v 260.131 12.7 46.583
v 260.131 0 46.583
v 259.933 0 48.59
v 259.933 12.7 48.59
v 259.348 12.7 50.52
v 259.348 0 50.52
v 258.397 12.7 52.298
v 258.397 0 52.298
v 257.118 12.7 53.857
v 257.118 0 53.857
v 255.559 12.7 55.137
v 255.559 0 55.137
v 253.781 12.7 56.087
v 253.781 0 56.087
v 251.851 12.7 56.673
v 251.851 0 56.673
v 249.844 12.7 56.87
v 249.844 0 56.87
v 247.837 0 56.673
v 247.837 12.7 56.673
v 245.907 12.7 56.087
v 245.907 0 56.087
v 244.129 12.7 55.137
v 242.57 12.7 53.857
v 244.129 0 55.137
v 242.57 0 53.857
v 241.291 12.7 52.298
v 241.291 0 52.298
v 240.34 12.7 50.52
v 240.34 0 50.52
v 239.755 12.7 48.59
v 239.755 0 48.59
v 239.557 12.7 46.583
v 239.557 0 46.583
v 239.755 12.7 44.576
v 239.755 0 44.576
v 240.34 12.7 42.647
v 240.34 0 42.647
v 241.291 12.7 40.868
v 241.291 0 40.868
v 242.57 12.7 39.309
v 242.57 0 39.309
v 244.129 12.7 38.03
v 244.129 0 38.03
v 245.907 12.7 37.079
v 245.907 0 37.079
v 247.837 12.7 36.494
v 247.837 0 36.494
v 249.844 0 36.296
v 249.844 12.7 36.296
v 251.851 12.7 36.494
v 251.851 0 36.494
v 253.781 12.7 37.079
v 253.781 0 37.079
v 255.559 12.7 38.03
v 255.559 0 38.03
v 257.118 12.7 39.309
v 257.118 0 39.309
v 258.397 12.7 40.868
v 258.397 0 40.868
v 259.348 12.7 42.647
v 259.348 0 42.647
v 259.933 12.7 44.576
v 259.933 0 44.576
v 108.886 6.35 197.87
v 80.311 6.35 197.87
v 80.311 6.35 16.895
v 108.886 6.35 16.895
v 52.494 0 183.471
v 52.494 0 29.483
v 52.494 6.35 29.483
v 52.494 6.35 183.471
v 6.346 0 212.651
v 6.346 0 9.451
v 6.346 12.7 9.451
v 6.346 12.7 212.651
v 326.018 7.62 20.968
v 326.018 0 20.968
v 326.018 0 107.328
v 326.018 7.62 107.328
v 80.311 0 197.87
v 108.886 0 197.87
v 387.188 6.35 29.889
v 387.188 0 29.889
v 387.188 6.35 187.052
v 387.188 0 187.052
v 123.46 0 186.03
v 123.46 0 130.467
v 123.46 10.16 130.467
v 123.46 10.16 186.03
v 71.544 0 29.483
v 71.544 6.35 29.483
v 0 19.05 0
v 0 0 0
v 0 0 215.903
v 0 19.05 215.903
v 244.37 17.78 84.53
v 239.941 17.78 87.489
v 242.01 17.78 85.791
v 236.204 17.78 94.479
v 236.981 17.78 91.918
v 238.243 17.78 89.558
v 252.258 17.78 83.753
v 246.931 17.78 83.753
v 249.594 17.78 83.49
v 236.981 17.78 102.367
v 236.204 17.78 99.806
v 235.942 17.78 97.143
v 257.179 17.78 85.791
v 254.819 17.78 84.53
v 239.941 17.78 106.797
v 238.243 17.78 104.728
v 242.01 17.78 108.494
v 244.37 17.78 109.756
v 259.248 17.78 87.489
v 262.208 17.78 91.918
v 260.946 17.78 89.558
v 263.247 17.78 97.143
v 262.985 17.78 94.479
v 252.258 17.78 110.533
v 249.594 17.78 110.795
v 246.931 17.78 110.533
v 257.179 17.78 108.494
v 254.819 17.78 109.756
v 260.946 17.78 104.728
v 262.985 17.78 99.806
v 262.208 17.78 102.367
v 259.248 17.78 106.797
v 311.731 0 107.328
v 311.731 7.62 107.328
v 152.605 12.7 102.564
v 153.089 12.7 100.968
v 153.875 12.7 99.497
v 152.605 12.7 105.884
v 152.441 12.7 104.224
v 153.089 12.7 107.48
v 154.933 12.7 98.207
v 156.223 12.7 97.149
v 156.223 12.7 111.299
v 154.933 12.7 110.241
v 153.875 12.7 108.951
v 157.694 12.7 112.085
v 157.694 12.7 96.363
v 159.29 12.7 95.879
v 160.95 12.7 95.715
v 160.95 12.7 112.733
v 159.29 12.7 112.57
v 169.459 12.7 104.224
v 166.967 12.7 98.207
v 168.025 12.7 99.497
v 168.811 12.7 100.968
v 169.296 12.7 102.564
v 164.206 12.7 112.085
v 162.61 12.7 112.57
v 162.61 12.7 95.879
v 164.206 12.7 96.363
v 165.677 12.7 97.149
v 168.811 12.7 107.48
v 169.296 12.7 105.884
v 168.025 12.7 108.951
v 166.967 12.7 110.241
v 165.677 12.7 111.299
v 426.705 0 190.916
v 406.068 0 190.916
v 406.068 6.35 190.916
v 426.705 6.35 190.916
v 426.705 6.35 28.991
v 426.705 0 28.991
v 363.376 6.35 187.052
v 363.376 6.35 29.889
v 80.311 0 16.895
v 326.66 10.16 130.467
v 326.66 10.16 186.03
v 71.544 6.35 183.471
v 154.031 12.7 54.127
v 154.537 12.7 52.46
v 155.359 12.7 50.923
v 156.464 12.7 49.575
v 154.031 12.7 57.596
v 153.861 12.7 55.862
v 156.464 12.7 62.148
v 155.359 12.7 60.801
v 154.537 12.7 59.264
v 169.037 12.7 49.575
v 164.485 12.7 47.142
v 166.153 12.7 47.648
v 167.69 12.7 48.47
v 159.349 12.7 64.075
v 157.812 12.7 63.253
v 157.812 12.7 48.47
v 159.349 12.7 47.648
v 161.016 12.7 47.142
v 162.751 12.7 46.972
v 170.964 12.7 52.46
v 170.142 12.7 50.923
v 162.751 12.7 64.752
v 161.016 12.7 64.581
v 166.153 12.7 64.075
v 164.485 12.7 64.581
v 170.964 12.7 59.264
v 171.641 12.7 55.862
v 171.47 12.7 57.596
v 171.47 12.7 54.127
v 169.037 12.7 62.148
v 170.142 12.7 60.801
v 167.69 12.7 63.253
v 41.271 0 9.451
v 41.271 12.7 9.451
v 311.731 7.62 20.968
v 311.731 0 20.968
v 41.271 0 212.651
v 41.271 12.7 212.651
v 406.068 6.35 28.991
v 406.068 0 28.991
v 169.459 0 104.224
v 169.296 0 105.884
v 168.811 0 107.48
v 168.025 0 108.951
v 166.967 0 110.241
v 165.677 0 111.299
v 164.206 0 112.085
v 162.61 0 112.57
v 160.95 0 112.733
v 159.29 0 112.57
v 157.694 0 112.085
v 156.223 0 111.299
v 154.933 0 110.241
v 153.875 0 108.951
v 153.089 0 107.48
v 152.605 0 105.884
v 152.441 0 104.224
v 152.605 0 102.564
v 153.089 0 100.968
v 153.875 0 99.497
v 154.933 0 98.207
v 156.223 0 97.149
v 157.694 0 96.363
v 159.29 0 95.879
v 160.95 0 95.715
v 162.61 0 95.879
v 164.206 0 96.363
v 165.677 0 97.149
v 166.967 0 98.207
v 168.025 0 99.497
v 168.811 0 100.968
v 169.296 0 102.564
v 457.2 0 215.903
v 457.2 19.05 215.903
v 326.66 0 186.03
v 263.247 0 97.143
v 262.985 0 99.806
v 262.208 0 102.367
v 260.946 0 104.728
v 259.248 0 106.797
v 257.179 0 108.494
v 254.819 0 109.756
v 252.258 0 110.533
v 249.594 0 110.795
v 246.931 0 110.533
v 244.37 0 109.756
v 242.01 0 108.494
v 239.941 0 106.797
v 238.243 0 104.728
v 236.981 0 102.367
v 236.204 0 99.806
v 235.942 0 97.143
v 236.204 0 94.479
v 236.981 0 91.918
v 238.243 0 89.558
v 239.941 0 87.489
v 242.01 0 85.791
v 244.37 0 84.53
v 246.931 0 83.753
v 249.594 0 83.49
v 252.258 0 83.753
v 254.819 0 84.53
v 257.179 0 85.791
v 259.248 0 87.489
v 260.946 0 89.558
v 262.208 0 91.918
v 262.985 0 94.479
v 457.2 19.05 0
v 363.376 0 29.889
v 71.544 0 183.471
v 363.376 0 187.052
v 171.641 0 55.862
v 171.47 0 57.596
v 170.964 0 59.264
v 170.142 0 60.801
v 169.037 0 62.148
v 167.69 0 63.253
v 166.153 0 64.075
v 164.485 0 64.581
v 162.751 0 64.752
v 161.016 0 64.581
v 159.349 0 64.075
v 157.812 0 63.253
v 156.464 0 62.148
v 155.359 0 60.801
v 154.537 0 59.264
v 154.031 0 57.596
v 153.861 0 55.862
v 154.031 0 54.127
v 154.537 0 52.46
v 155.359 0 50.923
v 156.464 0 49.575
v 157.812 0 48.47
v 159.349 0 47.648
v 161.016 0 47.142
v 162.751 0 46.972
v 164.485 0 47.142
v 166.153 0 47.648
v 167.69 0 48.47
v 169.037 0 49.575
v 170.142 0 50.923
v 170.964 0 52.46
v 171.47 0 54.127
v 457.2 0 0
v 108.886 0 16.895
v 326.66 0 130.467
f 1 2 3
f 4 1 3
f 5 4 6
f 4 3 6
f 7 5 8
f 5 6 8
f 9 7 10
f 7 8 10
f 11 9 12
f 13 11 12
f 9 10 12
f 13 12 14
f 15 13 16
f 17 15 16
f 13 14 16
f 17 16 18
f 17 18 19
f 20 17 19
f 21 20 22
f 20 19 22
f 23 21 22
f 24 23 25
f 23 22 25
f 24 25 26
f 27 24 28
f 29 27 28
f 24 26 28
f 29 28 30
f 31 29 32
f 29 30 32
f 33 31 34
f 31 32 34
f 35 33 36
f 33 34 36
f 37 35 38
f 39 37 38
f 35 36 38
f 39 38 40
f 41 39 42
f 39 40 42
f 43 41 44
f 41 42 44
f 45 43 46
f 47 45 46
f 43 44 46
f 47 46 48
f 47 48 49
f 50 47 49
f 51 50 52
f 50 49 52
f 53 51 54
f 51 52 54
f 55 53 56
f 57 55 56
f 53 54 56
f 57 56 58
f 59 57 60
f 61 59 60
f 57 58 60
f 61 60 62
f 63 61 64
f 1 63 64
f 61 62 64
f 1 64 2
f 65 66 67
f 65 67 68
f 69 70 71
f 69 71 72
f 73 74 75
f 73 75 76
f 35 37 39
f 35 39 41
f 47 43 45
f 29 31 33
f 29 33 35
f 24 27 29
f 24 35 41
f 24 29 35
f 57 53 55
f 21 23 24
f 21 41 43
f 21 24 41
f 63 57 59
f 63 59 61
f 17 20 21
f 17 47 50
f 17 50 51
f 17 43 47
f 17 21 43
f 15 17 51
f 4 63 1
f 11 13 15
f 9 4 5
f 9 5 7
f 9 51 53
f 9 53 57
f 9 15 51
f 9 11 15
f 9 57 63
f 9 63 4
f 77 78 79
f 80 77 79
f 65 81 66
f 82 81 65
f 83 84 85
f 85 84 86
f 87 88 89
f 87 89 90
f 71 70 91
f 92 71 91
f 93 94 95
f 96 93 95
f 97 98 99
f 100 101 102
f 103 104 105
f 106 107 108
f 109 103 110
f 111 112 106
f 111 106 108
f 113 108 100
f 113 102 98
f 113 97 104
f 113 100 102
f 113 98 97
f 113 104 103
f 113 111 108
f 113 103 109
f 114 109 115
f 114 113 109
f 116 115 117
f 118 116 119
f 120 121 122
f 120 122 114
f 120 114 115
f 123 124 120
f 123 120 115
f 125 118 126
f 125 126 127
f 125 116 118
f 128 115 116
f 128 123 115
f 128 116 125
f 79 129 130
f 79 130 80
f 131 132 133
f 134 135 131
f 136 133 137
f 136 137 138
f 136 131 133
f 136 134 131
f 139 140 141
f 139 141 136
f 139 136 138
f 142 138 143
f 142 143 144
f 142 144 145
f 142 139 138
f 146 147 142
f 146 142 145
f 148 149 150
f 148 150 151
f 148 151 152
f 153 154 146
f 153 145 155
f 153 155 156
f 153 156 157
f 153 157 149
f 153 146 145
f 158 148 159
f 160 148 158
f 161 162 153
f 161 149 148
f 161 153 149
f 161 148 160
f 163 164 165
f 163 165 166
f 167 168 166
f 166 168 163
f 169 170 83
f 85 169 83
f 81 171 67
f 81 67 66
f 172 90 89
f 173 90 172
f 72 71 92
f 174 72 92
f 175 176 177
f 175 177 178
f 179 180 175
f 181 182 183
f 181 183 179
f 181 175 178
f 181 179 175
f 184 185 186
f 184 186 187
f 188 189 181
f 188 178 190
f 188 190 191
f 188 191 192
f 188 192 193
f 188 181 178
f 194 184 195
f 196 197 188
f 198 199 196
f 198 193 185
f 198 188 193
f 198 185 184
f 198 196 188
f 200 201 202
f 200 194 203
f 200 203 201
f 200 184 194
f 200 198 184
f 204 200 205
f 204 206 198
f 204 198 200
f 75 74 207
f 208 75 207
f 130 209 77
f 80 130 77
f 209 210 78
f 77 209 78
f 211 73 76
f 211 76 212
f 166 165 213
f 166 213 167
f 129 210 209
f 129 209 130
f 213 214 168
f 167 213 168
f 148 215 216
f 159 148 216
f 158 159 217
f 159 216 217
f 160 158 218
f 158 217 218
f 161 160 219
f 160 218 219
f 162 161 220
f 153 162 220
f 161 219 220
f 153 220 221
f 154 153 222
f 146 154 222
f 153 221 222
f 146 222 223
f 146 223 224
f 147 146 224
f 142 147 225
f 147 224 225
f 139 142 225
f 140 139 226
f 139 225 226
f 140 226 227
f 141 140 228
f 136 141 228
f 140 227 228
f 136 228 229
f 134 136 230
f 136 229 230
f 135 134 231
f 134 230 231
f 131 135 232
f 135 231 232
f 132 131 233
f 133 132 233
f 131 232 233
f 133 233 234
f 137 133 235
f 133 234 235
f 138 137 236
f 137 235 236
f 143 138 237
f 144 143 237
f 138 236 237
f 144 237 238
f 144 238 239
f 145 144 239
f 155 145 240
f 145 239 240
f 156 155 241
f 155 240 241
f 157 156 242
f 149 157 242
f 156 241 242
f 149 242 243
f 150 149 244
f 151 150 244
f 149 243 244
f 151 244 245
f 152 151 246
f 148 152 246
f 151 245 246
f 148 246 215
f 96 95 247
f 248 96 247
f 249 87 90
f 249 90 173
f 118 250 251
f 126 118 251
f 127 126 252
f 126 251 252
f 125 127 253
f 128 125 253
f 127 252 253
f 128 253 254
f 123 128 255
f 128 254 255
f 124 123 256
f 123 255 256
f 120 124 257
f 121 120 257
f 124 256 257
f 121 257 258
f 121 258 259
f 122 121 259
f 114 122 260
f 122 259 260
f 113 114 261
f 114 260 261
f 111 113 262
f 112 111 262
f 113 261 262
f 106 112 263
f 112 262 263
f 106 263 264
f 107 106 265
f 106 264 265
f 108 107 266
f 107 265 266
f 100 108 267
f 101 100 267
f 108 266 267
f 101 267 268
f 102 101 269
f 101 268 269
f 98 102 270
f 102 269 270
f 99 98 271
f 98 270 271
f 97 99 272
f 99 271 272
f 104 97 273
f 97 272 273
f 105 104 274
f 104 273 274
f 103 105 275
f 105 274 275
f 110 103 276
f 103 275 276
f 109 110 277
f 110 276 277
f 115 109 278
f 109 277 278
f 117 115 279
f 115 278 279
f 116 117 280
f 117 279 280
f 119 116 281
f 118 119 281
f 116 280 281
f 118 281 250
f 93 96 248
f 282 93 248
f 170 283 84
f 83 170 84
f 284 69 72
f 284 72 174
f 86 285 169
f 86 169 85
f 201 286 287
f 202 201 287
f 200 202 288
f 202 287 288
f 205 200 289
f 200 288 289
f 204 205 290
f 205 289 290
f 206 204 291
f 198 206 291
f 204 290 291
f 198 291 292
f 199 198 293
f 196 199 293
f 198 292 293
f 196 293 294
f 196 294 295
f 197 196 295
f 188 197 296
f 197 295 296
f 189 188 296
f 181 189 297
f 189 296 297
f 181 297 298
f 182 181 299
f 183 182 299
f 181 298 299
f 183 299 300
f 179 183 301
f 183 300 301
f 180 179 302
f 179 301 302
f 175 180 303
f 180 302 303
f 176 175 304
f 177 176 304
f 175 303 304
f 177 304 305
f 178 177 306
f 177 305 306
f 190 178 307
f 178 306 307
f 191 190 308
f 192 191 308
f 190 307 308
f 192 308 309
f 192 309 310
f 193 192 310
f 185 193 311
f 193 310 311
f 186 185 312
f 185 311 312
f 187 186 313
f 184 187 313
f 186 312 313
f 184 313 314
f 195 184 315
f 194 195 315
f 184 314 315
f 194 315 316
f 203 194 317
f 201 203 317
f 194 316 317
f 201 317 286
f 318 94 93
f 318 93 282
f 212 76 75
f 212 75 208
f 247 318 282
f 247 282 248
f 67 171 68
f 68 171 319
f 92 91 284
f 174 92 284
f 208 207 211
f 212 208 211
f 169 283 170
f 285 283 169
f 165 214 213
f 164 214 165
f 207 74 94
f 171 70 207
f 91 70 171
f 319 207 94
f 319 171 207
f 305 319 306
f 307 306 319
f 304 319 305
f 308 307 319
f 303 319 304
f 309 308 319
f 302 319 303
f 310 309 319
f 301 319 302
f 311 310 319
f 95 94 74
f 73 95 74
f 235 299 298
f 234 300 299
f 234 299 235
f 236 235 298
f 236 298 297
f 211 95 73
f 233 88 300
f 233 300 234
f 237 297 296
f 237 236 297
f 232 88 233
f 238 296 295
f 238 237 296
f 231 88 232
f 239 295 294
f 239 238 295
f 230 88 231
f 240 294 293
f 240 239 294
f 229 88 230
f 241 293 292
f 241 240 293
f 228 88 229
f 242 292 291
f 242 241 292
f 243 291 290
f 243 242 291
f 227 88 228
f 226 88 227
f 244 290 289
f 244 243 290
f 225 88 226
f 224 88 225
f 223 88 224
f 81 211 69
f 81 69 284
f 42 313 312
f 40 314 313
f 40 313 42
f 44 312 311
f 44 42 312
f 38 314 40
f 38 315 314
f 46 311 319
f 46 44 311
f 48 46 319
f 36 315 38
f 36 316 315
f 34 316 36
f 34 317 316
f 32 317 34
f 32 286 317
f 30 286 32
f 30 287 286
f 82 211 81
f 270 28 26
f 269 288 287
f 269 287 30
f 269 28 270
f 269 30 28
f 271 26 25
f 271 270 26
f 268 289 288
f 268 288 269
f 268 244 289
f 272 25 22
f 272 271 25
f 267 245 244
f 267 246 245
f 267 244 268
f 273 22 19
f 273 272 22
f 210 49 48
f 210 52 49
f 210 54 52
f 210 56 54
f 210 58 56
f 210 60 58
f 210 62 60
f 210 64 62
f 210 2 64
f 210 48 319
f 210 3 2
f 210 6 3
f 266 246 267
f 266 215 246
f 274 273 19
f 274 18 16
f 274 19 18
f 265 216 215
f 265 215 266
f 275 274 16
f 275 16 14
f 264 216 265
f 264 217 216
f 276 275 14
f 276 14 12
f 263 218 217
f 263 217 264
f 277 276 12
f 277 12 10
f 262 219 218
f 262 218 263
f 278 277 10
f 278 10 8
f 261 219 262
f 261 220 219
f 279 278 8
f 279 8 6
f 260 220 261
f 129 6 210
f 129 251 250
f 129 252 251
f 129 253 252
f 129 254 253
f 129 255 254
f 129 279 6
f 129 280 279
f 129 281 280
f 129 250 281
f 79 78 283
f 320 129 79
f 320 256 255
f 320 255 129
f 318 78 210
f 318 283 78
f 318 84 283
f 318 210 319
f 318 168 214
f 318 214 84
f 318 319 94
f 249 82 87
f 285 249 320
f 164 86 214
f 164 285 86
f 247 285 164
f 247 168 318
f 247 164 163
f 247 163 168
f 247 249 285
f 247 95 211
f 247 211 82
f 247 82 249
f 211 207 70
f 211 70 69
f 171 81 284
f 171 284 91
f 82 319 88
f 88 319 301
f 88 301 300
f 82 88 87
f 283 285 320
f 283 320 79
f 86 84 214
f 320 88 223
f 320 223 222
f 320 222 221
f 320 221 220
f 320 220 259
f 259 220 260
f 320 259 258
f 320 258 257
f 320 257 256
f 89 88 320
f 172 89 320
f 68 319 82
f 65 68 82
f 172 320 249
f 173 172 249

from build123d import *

# Parameters (mm, degrees)
F0_W      = 457.2
F0_H      = 215.903491
F1_DEPTH  = 19.05
F2_W      = 20.6375
F2_H      = 161.925
F3_DEPTH  = 6.35
F4_W      = 23.8125
F4_H      = 157.1625
F5_DEPTH  = 6.35
F6_W      = 203.2
F6_H      = 55.5625
F7_DEPTH  = 10.16
F8_W      = 14.2875
F8_H      = 86.36
F9_DEPTH  = 7.62
F10_W     = 34.925
F10_H     = 203.2
F11_DEPTH = 12.7
F12_W     = 19.05
F12_H     = 153.9875
F13_DEPTH = 6.35
F14_R     = 13.6525
F15_DEPTH = 17.78
F16_R     = 10.287
F17_DEPTH = 12.7
F18_R     = 8.89
F19_DEPTH = 12.7
F20_R     = 8.509
F21_DEPTH = 12.7
F22_W     = 28.575
F22_H     = 180.975
F23_DEPTH = 6.35


with BuildPart() as f1:
    # F0 (on Front) → F1 (new body)
    with BuildSketch(Plane.XZ):
        with Locations((228.6, 107.951746)):
            Rectangle(F0_W, F0_H)
    extrude(amount=-F1_DEPTH)

    # F2 (on Front) → F3 (cut)
    with BuildSketch(Plane.XZ):
        with Locations((416.386539, 109.953294)):
            Rectangle(F2_W, F2_H)
    extrude(amount=-F3_DEPTH, mode=Mode.SUBTRACT)

    # F4 (on face) → F5 (cut)
    with BuildSketch(Plane.XZ):
        with Locations((375.281944, 108.470284)):
            Rectangle(F4_W, F4_H)
    extrude(amount=-F5_DEPTH, mode=Mode.SUBTRACT)

    # F6 (on face) → F7 (cut)
    with BuildSketch(Plane.XZ):
        with Locations((225.059846, 158.248464)):
            Rectangle(F6_W, F6_H)
    extrude(amount=-F7_DEPTH, mode=Mode.SUBTRACT)

    # F8 (on face) → F9 (cut)
    with BuildSketch(Plane.XZ):
        with Locations((318.874671, 64.148307)):
            Rectangle(F8_W, F8_H)
    extrude(amount=-F9_DEPTH, mode=Mode.SUBTRACT)

    # F10 (on face) → F11 (cut)
    with BuildSketch(Plane.XZ):
        with Locations((23.808912, 111.051154)):
            Rectangle(F10_W, F10_H)
    extrude(amount=-F11_DEPTH, mode=Mode.SUBTRACT)

    # F12 (on face) → F13 (cut)
    with BuildSketch(Plane.XZ):
        with Locations((62.019332, 106.47686)):
            Rectangle(F12_W, F12_H)
    extrude(amount=-F13_DEPTH, mode=Mode.SUBTRACT)

    # F14 (on face) → F15 (cut)
    with BuildSketch(Plane.XZ):
        with Locations((249.594485, 97.142791)):
            Circle(F14_R)
    extrude(amount=-F15_DEPTH, mode=Mode.SUBTRACT)

    # F16 (on face) → F17 (cut)
    with BuildSketch(Plane.XZ):
        with Locations((249.844001, 46.58331)):
            Circle(F16_R)
    extrude(amount=-F17_DEPTH, mode=Mode.SUBTRACT)

    # F18 (on face) → F19 (cut)
    with BuildSketch(Plane.XZ):
        with Locations((162.750646, 55.861603)):
            Circle(F18_R)
    extrude(amount=-F19_DEPTH, mode=Mode.SUBTRACT)

    # F20 (on face) → F21 (cut)
    with BuildSketch(Plane.XZ):
        with Locations((160.950046, 104.224064)):
            Circle(F20_R)
    extrude(amount=-F21_DEPTH, mode=Mode.SUBTRACT)

    # F22 (on face) → F23 (cut)
    with BuildSketch(Plane.XZ):
        with Locations((94.598287, 107.38296)):
            Rectangle(F22_W, F22_H)
    extrude(amount=-F23_DEPTH, mode=Mode.SUBTRACT)


solid = f1.part
